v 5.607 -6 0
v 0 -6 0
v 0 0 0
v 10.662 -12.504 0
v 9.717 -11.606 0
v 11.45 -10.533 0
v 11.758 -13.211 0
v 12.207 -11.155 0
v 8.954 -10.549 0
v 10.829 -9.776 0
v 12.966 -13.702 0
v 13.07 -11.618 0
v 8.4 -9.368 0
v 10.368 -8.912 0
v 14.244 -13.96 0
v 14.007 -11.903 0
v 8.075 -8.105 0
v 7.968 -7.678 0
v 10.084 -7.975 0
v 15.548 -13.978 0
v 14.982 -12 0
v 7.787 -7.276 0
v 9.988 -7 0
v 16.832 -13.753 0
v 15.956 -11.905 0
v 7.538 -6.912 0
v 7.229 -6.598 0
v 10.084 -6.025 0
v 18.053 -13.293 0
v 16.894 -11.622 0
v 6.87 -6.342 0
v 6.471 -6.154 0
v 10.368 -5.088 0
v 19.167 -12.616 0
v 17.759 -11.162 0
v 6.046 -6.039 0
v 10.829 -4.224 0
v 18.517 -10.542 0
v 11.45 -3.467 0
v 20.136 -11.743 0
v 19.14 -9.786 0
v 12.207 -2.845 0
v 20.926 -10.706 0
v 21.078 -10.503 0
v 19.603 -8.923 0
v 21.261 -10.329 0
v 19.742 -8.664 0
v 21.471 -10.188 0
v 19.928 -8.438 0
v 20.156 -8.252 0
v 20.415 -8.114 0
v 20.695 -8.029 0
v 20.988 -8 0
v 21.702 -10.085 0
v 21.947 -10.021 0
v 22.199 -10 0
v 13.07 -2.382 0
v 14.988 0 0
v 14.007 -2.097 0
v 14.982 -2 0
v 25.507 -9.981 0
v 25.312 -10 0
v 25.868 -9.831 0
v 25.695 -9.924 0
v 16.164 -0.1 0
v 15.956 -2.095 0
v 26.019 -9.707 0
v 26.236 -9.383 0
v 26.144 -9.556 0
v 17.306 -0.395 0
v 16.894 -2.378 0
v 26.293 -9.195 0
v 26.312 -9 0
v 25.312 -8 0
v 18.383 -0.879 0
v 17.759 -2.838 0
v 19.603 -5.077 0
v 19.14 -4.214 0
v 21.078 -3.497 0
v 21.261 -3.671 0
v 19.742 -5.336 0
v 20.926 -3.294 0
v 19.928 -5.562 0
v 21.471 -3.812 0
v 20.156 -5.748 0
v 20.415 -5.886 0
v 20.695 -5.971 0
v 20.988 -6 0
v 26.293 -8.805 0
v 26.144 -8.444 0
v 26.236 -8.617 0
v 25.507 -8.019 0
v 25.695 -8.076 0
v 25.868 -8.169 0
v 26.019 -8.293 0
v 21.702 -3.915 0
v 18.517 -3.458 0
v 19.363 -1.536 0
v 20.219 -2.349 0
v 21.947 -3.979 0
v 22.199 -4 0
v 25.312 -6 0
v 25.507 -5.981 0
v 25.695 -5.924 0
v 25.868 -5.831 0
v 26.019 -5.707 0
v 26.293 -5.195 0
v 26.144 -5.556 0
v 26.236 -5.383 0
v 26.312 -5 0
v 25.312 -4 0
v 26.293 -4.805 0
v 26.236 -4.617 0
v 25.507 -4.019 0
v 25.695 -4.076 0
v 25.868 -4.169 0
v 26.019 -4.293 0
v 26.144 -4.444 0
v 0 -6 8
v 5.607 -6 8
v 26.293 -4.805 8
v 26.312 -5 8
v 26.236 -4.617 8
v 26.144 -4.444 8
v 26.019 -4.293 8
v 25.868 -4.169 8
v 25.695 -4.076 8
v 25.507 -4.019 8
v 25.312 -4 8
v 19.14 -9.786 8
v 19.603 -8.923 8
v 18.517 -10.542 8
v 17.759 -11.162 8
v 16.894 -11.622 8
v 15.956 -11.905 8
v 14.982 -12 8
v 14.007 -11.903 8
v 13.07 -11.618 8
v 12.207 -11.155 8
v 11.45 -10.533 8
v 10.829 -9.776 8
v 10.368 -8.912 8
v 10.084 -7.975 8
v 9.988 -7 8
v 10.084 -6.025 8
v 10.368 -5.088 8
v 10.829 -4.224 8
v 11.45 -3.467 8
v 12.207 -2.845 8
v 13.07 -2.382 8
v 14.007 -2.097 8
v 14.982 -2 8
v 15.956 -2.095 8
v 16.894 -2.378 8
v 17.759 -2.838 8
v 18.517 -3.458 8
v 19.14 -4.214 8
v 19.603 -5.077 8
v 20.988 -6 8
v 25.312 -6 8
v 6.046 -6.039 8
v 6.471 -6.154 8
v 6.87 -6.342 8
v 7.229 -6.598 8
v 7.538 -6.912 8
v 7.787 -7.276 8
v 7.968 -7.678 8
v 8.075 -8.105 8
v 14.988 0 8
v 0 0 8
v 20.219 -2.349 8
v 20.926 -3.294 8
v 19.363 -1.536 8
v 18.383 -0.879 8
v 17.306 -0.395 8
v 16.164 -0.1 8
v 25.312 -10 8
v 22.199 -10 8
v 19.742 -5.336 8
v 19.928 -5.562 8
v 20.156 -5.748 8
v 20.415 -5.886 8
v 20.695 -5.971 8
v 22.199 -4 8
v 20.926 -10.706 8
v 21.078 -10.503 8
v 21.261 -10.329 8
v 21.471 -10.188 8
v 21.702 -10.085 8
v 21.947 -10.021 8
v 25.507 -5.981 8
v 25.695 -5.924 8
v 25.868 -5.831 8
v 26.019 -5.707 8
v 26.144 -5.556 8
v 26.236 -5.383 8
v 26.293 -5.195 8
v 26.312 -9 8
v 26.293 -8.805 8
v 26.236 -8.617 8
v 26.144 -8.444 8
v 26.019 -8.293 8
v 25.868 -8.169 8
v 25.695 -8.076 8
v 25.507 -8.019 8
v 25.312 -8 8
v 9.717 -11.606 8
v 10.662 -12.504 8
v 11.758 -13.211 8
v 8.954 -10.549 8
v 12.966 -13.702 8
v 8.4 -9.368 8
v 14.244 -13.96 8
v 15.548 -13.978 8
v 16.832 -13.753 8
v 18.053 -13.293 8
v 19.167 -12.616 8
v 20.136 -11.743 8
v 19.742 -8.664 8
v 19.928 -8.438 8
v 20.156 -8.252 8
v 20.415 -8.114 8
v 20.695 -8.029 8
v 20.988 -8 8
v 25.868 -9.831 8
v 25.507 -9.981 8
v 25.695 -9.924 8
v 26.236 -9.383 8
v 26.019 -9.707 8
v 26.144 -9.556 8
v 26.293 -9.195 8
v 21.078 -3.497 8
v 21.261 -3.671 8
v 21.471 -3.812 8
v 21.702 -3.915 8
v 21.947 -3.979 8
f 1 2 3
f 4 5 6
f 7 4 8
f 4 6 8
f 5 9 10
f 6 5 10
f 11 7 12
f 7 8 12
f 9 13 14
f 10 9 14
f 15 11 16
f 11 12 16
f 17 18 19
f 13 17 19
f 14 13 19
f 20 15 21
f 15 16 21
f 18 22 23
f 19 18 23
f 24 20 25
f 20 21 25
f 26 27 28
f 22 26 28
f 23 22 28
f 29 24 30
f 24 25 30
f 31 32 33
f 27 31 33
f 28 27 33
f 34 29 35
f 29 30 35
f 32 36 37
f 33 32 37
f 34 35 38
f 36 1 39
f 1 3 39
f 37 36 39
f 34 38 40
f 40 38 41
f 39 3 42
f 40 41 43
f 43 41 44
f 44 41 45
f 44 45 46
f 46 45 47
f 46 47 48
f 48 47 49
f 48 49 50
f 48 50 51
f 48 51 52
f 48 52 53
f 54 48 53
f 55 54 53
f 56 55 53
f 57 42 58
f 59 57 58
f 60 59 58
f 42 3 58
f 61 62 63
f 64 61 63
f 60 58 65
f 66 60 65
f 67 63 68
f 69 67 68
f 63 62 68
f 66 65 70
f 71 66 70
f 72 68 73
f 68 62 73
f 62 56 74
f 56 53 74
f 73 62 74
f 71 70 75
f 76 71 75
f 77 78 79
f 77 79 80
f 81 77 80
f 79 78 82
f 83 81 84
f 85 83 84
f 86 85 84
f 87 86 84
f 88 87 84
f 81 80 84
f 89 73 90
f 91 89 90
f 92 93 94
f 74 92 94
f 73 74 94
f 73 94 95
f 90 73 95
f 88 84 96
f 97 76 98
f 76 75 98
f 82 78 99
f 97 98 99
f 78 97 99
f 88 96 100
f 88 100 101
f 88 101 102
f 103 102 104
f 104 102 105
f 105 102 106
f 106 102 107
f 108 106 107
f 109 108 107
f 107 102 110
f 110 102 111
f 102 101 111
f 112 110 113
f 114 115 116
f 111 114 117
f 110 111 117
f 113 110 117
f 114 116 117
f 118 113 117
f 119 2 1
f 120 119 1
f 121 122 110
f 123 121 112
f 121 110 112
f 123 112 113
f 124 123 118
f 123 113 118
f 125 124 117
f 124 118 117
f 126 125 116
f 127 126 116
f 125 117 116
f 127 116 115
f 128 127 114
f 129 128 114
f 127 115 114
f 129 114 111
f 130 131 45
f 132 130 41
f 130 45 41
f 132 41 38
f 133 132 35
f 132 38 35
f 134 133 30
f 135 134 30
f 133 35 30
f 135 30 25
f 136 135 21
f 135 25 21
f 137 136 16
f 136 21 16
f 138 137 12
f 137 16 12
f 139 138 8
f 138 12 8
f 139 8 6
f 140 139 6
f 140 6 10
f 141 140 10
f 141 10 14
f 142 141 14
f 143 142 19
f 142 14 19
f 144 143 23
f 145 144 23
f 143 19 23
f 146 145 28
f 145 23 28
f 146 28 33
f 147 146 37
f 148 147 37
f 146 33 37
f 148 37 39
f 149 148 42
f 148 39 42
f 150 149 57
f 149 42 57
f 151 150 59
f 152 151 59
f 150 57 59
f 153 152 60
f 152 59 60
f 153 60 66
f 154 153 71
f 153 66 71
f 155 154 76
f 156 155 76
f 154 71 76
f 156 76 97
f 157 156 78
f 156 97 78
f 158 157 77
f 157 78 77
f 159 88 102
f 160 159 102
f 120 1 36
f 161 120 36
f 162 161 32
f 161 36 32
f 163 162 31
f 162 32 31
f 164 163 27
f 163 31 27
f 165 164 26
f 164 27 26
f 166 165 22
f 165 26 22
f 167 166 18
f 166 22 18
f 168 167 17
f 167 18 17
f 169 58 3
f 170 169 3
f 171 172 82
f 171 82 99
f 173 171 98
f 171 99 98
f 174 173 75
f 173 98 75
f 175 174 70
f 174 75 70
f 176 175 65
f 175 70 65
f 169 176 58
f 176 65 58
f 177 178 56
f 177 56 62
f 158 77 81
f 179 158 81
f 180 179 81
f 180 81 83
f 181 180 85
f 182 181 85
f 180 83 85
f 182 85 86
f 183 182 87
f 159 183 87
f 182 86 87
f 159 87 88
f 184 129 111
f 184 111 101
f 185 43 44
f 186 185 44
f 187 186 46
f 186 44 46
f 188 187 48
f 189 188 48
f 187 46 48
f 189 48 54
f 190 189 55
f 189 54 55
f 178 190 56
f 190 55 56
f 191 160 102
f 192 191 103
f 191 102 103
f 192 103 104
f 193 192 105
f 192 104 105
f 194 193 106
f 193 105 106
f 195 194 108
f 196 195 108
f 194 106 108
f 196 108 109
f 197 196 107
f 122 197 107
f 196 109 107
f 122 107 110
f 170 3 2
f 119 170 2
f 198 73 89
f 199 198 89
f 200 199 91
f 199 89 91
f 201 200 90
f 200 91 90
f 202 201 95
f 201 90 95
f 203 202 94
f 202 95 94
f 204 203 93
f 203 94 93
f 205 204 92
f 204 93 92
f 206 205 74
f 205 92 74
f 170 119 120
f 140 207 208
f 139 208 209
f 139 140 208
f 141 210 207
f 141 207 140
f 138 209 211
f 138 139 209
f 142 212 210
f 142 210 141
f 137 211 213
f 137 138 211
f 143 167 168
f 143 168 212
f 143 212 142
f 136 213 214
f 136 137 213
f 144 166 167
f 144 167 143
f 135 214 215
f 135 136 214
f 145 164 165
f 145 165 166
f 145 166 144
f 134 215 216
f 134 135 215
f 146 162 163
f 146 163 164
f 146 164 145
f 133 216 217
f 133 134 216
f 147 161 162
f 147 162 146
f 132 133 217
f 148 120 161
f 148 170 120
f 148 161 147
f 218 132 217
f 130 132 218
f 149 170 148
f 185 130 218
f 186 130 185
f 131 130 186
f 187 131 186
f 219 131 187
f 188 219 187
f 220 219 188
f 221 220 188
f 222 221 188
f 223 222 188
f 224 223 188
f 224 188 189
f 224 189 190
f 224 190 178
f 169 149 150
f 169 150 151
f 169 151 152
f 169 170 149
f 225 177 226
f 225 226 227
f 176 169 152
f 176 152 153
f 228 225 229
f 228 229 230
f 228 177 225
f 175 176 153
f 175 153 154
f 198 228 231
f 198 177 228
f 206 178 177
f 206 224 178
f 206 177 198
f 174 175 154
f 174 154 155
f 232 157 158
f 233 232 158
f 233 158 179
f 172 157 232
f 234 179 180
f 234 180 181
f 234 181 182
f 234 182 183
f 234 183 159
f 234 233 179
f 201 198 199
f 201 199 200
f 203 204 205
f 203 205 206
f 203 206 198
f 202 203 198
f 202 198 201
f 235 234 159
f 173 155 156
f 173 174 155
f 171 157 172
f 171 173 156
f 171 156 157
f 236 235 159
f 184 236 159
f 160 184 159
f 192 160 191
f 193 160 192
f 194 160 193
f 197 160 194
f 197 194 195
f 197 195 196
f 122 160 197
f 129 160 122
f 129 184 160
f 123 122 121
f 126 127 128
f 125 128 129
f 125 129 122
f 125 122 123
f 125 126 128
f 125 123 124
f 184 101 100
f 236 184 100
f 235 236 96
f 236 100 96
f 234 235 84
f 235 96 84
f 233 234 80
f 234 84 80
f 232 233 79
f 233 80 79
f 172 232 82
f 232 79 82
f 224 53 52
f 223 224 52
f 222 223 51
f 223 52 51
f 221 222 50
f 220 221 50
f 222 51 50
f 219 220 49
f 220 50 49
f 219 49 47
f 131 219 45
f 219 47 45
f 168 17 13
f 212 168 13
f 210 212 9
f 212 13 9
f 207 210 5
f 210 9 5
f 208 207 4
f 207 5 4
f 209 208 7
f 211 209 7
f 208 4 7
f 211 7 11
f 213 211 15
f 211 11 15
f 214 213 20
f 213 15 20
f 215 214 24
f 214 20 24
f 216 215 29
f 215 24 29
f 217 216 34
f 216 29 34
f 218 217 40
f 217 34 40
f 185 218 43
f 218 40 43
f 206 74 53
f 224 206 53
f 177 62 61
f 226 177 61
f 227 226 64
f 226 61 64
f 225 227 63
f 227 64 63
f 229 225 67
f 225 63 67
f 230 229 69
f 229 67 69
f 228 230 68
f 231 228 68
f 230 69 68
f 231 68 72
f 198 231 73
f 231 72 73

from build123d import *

# Parameters (mm, degrees)
F1_DEPTH = 8


with BuildPart() as f1:
    # F0 (on Top) → F1 (new body)
    with BuildSketch(Plane.XY):
        with BuildLine():
            Line((8, 0), (0, 0))
            Line((0, 0), (0, -6))
            Line((0, -6), (5.606788, -6))
            ThreePointArc((5.606788, -6), (7.229002, -6.597785), (8.075428, -8.105263))
            ThreePointArc((8.075428, -8.105263), (13.599168, -13.860919), (20.926175, -10.705882))
            ThreePointArc((20.926175, -10.705882), (21.471115, -10.188288), (22.198722, -10))
            Line((22.198722, -10), (25.312175, -10))
            ThreePointArc((25.312175, -10), (26.019282, -9.707107), (26.312175, -9))
            ThreePointArc((26.312175, -9), (26.019282, -8.292893), (25.312175, -8))
            Line((25.312175, -8), (21.915823, -8))
            Line((21.915823, -8), (20.98762, -8))
            ThreePointArc((20.98762, -8), (20.155569, -8.251925), (19.603004, -8.923077))
            ThreePointArc((19.603004, -8.923077), (9.98762, -7), (19.603004, -5.076923))
            ThreePointArc((19.603004, -5.076923), (20.155569, -5.748075), (20.98762, -6))
            Line((20.98762, -6), (21.915823, -6))
            Line((21.915823, -6), (25.312175, -6))
            ThreePointArc((25.312175, -6), (26.019282, -5.707107), (26.312175, -5))
            ThreePointArc((26.312175, -5), (26.019282, -4.292893), (25.312175, -4))
            Line((25.312175, -4), (22.198722, -4))
            ThreePointArc((22.198722, -4), (21.471115, -3.811712), (20.926175, -3.294118))
            ThreePointArc((20.926175, -3.294118), (18.383118, -0.878678), (14.98762, 0))
            Line((14.98762, 0), (8, 0))
        make_face()
    extrude(amount=F1_DEPTH)


solid = f1.part
